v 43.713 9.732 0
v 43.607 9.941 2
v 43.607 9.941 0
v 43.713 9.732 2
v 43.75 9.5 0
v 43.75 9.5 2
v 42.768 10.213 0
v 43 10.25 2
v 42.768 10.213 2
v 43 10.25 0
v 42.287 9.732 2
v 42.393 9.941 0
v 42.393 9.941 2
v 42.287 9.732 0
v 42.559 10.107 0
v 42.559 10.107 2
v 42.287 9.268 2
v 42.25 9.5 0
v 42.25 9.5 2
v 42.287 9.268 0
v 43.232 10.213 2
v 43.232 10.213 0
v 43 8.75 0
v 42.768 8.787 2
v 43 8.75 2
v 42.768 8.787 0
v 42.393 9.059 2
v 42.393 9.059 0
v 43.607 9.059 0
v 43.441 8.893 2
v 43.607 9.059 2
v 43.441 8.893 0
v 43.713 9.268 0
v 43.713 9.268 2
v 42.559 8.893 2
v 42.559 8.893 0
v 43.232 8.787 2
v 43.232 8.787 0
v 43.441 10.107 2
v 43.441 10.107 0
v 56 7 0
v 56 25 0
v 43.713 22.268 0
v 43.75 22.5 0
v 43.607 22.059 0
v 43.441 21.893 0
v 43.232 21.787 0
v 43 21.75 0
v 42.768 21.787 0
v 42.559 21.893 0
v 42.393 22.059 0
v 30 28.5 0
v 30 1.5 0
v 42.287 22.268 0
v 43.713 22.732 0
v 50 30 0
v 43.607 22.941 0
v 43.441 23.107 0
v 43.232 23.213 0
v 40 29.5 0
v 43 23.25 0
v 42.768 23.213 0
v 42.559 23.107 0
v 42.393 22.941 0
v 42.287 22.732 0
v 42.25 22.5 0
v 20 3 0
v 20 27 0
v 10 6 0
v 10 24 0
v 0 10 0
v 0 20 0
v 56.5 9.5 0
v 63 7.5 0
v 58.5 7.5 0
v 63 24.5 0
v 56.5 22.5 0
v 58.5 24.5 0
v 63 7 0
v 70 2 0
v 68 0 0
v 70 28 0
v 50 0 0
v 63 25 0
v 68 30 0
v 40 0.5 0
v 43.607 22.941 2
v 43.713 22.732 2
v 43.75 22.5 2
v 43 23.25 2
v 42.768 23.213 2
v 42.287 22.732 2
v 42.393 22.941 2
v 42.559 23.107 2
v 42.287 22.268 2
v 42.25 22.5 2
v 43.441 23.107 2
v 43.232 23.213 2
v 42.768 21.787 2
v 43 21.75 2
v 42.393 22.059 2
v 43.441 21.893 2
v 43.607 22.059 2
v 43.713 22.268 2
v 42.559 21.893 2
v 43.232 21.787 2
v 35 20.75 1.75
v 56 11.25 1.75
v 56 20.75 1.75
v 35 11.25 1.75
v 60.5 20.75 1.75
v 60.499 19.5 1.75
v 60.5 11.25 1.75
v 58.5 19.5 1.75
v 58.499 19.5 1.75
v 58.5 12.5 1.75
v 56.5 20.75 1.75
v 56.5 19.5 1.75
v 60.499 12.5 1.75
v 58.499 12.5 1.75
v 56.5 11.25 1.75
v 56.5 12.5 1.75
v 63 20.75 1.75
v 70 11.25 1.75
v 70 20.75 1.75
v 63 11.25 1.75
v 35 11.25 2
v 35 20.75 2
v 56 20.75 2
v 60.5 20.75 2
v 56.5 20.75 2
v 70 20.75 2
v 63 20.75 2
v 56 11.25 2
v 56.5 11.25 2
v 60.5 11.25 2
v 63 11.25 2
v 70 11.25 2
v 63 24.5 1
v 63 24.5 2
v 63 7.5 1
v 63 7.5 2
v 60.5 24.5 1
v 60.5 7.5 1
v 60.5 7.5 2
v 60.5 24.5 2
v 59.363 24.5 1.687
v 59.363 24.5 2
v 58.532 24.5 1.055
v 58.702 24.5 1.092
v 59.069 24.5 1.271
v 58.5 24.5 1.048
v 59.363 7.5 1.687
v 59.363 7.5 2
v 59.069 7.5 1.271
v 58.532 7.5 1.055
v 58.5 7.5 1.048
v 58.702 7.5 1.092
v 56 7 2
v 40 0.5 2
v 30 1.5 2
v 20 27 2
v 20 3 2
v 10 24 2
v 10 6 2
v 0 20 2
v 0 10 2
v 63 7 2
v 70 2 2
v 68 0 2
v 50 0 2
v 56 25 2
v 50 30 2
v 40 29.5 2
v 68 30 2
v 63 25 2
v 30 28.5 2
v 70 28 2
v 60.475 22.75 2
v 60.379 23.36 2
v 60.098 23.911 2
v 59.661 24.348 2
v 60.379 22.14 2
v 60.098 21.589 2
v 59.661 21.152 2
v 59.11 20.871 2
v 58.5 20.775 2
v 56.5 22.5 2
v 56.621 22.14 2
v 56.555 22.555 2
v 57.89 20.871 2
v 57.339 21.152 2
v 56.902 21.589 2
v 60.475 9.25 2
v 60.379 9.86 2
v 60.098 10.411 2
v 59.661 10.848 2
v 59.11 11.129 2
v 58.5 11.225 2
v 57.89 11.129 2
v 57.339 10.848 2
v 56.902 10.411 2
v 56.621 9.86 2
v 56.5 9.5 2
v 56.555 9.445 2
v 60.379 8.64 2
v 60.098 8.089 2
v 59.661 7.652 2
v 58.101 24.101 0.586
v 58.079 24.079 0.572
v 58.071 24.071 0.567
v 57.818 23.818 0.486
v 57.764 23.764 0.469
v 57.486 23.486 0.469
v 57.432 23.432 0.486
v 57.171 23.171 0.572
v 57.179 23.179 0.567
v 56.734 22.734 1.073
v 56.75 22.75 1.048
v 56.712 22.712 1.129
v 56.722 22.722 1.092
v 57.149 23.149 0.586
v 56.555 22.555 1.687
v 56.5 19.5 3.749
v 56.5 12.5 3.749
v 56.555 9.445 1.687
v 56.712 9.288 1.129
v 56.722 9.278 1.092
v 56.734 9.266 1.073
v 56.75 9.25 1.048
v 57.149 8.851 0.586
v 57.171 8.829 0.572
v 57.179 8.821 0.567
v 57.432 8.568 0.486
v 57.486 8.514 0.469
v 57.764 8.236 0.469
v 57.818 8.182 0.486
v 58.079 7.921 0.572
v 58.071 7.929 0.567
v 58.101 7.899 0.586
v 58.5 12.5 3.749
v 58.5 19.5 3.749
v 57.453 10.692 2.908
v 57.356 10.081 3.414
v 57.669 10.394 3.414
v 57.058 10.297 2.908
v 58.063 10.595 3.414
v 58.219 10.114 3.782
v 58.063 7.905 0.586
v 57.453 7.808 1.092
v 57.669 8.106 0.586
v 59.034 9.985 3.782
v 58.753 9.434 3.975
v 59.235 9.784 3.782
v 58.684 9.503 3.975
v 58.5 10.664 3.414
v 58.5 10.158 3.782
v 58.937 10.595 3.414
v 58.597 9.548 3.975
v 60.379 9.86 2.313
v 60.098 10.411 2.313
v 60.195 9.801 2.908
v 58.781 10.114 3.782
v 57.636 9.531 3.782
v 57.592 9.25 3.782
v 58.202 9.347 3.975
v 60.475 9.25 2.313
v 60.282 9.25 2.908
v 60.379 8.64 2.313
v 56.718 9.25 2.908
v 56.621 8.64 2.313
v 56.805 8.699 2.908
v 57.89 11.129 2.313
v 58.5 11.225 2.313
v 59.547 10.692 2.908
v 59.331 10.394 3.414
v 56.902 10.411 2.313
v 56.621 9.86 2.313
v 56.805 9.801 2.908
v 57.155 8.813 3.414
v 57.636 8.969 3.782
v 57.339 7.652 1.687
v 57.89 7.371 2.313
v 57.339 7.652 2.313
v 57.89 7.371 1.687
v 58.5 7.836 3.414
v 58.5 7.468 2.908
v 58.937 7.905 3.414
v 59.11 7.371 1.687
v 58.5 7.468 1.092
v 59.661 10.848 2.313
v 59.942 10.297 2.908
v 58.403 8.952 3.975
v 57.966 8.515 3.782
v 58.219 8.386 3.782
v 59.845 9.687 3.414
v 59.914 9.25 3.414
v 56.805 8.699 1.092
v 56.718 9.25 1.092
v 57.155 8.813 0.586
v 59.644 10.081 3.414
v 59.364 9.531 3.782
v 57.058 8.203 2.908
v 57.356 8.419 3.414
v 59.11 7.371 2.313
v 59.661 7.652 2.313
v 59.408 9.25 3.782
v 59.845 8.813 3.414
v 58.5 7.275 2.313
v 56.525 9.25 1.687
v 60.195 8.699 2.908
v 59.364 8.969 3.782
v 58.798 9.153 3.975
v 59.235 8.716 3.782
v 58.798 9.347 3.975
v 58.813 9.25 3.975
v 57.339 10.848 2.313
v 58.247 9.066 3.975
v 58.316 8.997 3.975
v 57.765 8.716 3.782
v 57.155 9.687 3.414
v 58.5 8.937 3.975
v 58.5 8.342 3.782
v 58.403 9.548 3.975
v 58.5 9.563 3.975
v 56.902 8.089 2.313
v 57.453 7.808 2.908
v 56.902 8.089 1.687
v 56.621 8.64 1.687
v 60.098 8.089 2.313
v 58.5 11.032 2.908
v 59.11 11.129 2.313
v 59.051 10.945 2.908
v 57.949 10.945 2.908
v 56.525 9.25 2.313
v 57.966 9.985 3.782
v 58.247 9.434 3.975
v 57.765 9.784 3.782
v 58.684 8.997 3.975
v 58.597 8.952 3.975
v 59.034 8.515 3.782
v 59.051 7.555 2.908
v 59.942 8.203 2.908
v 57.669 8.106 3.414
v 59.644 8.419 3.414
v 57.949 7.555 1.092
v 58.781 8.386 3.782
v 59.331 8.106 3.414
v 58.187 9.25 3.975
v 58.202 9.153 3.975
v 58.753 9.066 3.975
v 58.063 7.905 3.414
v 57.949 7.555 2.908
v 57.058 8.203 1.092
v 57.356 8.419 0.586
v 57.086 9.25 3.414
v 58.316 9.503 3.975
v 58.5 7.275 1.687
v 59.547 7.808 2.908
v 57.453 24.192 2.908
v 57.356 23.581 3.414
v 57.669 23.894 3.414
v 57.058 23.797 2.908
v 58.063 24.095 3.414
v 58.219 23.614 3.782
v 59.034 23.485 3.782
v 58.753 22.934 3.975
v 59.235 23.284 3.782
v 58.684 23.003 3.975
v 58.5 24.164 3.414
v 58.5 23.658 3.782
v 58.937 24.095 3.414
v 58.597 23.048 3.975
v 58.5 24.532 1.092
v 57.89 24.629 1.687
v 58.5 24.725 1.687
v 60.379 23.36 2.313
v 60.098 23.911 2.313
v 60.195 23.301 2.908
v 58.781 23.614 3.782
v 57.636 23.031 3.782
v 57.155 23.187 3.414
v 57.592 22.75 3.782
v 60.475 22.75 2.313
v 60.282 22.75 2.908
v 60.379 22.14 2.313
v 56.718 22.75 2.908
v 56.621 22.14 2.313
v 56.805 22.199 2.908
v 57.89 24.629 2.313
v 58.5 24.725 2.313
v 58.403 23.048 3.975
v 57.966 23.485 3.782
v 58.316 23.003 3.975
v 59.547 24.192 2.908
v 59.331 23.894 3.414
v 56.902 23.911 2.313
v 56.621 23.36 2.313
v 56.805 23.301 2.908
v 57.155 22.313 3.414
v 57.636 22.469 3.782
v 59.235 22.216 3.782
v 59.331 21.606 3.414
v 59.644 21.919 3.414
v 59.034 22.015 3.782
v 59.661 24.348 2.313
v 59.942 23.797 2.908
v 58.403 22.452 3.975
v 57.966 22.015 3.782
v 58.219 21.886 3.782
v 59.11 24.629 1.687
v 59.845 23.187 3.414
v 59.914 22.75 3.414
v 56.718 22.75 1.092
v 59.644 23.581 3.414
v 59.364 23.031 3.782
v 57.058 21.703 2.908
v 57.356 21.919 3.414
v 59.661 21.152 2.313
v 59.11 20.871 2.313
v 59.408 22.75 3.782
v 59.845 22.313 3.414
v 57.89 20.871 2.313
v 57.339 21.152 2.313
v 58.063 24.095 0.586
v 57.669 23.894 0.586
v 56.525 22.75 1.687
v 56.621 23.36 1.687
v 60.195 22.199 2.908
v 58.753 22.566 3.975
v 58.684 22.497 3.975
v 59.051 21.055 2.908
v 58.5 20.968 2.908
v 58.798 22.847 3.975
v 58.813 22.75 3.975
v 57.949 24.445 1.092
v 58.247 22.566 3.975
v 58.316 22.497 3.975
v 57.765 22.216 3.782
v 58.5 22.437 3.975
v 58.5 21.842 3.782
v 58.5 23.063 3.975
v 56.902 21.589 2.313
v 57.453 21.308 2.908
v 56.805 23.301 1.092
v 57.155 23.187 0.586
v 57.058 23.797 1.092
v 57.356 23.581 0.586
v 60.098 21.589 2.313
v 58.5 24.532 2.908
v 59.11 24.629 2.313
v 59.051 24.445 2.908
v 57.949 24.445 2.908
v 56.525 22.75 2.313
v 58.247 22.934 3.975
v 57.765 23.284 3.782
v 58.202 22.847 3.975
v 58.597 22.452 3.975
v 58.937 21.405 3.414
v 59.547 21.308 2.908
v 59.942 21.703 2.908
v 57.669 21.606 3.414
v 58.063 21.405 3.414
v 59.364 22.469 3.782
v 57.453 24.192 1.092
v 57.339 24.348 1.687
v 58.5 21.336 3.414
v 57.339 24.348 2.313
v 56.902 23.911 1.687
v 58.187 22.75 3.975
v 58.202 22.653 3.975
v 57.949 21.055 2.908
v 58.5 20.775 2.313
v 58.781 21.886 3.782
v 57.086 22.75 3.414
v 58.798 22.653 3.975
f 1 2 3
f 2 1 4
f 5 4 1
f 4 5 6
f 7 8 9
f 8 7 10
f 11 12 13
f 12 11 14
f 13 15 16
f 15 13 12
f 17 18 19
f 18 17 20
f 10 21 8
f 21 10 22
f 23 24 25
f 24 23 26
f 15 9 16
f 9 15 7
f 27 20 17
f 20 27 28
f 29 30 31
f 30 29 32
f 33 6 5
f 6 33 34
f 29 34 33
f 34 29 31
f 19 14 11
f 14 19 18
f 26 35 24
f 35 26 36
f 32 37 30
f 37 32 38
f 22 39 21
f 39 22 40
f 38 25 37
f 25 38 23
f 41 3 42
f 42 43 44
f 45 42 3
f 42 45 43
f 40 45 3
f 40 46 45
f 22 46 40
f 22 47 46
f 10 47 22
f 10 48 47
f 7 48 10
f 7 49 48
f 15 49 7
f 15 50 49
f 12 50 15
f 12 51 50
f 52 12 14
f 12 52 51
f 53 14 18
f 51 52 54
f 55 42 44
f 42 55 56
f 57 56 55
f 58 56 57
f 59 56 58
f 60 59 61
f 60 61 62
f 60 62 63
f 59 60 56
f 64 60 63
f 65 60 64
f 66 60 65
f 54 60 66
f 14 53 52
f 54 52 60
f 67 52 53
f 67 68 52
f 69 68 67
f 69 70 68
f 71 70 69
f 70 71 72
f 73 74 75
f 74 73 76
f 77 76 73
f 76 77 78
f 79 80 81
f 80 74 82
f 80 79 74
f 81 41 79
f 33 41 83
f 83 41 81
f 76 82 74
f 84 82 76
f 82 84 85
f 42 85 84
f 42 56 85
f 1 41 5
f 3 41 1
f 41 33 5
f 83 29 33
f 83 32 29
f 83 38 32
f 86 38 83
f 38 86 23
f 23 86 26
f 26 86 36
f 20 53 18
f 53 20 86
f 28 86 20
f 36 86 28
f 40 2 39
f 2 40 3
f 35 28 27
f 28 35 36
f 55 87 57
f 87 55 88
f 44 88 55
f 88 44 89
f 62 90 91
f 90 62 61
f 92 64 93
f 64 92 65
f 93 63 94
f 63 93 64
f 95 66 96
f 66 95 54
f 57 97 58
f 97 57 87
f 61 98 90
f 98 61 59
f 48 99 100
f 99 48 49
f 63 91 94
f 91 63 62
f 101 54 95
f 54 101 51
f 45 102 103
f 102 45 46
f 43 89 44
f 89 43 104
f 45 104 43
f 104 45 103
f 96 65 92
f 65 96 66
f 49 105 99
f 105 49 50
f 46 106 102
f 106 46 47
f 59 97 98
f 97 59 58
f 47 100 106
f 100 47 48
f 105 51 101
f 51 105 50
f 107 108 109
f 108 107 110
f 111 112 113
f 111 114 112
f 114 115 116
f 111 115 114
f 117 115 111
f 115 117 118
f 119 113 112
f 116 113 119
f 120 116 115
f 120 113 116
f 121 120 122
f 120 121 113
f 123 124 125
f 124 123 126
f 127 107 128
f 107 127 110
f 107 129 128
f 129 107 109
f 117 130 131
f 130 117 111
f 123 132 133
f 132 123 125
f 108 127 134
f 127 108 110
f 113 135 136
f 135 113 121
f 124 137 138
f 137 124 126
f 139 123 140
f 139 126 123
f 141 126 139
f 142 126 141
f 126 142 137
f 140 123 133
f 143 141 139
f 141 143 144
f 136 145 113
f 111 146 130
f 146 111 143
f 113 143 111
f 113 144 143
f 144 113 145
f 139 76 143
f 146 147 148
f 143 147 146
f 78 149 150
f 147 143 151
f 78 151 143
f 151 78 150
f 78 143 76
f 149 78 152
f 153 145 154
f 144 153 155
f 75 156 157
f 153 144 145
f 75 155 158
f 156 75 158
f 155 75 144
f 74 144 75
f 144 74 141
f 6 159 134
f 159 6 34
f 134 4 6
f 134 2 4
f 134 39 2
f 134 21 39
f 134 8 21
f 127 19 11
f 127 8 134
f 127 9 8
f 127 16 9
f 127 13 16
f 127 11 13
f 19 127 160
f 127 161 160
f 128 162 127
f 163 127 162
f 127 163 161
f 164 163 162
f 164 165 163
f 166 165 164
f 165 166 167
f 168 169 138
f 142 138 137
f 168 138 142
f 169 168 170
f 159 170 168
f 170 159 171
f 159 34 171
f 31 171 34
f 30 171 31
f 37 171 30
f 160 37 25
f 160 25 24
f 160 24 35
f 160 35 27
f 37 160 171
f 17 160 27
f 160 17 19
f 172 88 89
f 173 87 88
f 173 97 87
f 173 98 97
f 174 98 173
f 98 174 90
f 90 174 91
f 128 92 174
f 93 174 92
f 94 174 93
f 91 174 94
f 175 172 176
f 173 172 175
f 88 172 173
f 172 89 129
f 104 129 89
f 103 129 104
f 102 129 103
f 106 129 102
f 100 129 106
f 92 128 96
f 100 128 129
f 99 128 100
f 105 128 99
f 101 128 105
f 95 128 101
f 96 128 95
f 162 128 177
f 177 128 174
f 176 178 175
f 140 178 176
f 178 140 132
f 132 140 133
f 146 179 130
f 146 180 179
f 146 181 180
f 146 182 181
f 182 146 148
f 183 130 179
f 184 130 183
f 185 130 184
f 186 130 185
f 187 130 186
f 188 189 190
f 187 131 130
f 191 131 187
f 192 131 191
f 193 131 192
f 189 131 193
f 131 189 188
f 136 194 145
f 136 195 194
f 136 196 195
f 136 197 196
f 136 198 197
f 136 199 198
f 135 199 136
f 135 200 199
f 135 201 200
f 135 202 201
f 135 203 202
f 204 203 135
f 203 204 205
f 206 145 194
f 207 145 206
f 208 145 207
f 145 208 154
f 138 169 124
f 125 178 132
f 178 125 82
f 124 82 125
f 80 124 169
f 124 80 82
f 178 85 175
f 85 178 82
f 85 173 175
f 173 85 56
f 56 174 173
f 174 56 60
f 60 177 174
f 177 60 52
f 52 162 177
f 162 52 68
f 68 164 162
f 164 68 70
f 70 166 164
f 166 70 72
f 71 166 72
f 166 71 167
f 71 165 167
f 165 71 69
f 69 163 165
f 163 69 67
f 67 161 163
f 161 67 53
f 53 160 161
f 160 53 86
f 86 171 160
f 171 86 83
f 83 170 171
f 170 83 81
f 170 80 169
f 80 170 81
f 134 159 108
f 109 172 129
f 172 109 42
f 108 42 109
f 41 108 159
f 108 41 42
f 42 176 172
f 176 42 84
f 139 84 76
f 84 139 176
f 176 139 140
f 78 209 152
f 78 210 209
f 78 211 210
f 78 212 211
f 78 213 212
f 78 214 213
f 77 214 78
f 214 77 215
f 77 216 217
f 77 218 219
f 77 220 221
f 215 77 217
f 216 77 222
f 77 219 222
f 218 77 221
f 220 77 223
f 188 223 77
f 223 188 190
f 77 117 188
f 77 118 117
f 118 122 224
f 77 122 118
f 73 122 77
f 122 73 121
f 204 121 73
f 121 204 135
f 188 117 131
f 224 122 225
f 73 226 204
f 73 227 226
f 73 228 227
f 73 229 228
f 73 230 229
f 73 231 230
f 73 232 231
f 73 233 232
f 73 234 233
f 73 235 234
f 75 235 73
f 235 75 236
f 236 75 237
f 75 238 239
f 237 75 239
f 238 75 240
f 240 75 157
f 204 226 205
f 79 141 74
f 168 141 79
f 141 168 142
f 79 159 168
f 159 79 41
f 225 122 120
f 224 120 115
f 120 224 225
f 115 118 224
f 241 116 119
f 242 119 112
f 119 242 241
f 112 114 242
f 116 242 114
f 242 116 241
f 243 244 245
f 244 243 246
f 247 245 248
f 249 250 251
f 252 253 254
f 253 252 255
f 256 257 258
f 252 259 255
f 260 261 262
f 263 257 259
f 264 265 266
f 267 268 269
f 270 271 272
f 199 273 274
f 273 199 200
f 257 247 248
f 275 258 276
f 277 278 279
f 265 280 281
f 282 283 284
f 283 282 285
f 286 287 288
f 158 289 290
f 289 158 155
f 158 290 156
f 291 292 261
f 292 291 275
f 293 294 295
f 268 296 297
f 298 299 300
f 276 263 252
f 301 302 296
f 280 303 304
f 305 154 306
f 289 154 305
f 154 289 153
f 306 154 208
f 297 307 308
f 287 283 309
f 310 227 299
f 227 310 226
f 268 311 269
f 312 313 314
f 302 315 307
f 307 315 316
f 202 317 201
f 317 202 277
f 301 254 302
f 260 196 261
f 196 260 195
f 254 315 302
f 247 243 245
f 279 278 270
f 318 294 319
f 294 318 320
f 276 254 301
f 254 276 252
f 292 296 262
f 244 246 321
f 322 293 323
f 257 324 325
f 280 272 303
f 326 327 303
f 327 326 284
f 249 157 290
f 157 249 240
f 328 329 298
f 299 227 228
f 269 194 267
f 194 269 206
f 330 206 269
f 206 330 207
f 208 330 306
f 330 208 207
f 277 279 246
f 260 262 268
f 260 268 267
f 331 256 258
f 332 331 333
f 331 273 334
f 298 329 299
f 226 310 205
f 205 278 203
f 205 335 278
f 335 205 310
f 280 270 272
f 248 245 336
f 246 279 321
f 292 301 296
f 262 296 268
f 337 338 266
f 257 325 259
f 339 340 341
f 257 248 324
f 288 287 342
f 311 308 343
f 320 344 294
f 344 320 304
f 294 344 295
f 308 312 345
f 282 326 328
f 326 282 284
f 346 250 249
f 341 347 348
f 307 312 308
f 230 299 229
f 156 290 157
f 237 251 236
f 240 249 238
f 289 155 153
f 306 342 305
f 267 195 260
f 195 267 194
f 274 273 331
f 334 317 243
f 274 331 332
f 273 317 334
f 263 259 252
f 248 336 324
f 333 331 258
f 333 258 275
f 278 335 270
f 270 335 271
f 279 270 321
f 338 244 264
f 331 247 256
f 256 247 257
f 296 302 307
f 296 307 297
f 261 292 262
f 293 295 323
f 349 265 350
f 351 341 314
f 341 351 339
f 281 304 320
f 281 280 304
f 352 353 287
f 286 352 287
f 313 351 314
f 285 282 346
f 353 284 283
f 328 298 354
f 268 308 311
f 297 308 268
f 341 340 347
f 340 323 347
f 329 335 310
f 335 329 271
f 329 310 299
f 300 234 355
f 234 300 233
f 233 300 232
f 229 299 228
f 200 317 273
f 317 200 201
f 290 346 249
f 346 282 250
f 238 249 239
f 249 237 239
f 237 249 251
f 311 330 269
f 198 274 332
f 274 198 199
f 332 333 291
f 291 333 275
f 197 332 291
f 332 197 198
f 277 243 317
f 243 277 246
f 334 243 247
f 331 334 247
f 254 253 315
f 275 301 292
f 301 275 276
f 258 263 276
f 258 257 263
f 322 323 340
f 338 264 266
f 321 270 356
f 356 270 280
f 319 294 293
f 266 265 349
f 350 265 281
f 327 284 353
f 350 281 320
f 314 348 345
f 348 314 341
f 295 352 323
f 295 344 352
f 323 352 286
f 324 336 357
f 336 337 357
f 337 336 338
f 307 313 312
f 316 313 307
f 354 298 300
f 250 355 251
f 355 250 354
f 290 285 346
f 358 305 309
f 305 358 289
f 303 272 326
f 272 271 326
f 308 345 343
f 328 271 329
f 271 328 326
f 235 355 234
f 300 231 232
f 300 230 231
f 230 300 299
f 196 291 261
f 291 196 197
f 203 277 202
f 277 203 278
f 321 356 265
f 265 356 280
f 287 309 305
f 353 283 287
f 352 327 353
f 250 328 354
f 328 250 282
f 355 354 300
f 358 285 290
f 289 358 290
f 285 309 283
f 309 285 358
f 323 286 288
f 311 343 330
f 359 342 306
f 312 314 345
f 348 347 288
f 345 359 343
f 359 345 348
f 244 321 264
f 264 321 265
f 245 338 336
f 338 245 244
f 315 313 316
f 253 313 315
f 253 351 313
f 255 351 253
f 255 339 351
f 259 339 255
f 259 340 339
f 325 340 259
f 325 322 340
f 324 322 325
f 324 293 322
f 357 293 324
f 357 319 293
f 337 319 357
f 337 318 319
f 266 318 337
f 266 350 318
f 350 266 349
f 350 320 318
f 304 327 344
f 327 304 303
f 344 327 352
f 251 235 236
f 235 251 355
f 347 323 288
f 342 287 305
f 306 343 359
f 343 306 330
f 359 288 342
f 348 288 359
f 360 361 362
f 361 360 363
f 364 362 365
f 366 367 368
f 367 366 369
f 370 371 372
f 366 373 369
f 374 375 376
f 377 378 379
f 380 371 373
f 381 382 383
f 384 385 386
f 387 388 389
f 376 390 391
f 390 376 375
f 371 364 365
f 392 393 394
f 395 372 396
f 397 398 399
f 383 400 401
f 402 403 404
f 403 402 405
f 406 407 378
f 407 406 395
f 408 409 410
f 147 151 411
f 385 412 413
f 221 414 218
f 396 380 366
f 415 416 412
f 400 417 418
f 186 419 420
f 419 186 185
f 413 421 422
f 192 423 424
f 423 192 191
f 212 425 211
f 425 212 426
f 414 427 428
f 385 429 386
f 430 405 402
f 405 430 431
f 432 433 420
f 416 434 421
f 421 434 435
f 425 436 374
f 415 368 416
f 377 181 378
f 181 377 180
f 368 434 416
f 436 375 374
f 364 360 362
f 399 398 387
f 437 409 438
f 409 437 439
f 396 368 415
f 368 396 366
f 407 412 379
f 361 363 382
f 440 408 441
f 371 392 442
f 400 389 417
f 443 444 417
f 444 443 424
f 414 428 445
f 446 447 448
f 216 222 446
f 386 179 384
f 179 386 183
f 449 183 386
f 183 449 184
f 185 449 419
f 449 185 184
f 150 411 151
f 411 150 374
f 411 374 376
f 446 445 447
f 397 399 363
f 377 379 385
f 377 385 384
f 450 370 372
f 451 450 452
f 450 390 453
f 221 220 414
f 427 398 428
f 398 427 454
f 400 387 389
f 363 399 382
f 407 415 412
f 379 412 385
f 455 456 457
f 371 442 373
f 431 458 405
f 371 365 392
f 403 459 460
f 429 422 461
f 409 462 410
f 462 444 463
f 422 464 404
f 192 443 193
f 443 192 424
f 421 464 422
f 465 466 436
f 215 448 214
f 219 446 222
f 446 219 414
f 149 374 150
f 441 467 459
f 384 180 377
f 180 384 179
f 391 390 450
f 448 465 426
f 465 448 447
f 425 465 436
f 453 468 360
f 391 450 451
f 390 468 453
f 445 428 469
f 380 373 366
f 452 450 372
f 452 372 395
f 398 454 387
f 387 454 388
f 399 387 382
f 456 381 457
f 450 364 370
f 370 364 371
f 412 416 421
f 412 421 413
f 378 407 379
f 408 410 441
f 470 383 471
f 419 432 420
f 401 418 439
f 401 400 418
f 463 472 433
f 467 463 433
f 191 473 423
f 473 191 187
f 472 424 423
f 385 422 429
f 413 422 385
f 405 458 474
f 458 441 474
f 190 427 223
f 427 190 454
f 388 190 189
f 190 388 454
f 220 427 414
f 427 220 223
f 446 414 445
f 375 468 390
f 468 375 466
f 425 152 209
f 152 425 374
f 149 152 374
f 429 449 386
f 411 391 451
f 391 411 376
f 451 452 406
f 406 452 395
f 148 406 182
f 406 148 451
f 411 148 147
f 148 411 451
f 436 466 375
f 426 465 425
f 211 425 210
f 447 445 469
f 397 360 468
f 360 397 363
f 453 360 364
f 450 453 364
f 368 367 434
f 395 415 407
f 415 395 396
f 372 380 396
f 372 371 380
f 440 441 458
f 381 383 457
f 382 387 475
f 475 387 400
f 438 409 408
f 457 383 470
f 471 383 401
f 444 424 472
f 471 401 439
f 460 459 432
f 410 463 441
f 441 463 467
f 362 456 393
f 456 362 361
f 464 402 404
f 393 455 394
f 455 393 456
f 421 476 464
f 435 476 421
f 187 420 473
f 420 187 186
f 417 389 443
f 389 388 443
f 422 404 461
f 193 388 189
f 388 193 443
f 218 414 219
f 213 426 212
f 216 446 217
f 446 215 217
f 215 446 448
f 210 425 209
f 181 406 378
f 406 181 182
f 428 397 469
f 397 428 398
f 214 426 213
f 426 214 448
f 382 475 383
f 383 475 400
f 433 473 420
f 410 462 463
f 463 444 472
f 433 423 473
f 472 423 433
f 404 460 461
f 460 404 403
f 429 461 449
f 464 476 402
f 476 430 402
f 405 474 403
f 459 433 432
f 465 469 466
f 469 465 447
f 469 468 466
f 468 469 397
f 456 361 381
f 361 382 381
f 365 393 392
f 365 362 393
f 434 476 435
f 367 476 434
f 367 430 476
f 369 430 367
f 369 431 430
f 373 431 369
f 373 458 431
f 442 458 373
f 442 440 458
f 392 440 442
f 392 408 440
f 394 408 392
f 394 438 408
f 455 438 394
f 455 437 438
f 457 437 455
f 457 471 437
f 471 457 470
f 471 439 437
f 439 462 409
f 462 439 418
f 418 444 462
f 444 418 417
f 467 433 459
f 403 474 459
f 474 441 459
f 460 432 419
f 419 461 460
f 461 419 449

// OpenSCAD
// In order to fit the backband, this piece needs to be cylindrically
// deformed before printing.
// I do this in MeshLab using
//  Filters->Smoothing, Fairing and Deformation->Geometric Function
// and then entering in z+sqrt(80^2-(x-35)^2)-80 for the z function

bodyPolygon = [[0,10],[0,20],[10,24],[20,27],[30,28.5],[40,29.5],[50,30],[68,30],[70,28],
[70,2],[68,0],[50,0],[40,0.5],[30,1.5],[20,3],[10,6],
[56,7],[63,7],[63,7.5],[58.5,7.5],[56.5,9.5],[56.5,22.5],[58.5,24.5],[63,24.5],[63,25],[56,25]];

union() {
    difference() {
        union() {
            //body
            linear_extrude(height=2) {
                polygon(points = bodyPolygon, paths = [[0,1,2,3,4,5,6,7,8,9,10,11,12,13,14,15],[16,17,18,19,20,21,22,23,24,25]],convexity=6);
            }
        }
        union() {
            //mounting holes
            translate([43,9.5,0]) {
                cylinder(r=0.75,h=3,$fn=20);
            }
            translate([43,22.5,0]) {
                cylinder(r=0.75,h=3,$fn=20);
            }
            //strap track
            translate([35,11.25,1.75]) cube([48,9.5,2]);
            //flex gap
            translate([60.5,7.5,1]) cube([2.5,17,2]);
        }
    }
    
    translate([58.5,9.25,2]) sphere(r=2,$fn=20);
    translate([58.5,22.75,2]) sphere(r=2,$fn=20);
    
    //teeth (dz should be 3.75, reduced slightly to eliminate warning
    translate([56.5,12.5,3.749])
    rotate([-90,0,0]) {
        linear_extrude(7) {
            polygon(points = [[0,0],[0,2],[2,2]]);
        }
        linear_extrude(7) {
            polygon(points = [[2,0],[2,2],[4,2]]);
        }
    }
}
